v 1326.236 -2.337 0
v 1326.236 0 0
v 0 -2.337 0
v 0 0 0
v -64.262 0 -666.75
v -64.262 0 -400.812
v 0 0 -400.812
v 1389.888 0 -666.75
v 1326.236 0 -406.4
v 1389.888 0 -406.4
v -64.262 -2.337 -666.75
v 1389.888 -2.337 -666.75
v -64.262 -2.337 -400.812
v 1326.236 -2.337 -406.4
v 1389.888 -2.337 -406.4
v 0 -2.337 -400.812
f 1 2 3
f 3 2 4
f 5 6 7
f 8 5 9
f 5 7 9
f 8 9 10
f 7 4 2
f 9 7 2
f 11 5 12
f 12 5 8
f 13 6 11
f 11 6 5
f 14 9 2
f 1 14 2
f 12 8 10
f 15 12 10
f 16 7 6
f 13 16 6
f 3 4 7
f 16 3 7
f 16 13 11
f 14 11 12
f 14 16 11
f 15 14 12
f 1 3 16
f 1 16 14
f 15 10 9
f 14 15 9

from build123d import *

# Parameters (mm, degrees)
F1_DEPTH = 2.3368


with BuildPart() as f1:
    # F0 (on Front) → F1 (new body)
    with BuildSketch(Plane.XZ):
        Polygon((1326.235613, 2.9e-05), (1.3e-05, 2.9e-05), (1.3e-05, -400.811971), (-64.261987, -400.811971), (-64.261987, -666.749971), (1389.888013, -666.749971), (1389.888013, -406.399971), (1326.235613, -406.399971), align=None)
    extrude(amount=F1_DEPTH)


solid = f1.part
